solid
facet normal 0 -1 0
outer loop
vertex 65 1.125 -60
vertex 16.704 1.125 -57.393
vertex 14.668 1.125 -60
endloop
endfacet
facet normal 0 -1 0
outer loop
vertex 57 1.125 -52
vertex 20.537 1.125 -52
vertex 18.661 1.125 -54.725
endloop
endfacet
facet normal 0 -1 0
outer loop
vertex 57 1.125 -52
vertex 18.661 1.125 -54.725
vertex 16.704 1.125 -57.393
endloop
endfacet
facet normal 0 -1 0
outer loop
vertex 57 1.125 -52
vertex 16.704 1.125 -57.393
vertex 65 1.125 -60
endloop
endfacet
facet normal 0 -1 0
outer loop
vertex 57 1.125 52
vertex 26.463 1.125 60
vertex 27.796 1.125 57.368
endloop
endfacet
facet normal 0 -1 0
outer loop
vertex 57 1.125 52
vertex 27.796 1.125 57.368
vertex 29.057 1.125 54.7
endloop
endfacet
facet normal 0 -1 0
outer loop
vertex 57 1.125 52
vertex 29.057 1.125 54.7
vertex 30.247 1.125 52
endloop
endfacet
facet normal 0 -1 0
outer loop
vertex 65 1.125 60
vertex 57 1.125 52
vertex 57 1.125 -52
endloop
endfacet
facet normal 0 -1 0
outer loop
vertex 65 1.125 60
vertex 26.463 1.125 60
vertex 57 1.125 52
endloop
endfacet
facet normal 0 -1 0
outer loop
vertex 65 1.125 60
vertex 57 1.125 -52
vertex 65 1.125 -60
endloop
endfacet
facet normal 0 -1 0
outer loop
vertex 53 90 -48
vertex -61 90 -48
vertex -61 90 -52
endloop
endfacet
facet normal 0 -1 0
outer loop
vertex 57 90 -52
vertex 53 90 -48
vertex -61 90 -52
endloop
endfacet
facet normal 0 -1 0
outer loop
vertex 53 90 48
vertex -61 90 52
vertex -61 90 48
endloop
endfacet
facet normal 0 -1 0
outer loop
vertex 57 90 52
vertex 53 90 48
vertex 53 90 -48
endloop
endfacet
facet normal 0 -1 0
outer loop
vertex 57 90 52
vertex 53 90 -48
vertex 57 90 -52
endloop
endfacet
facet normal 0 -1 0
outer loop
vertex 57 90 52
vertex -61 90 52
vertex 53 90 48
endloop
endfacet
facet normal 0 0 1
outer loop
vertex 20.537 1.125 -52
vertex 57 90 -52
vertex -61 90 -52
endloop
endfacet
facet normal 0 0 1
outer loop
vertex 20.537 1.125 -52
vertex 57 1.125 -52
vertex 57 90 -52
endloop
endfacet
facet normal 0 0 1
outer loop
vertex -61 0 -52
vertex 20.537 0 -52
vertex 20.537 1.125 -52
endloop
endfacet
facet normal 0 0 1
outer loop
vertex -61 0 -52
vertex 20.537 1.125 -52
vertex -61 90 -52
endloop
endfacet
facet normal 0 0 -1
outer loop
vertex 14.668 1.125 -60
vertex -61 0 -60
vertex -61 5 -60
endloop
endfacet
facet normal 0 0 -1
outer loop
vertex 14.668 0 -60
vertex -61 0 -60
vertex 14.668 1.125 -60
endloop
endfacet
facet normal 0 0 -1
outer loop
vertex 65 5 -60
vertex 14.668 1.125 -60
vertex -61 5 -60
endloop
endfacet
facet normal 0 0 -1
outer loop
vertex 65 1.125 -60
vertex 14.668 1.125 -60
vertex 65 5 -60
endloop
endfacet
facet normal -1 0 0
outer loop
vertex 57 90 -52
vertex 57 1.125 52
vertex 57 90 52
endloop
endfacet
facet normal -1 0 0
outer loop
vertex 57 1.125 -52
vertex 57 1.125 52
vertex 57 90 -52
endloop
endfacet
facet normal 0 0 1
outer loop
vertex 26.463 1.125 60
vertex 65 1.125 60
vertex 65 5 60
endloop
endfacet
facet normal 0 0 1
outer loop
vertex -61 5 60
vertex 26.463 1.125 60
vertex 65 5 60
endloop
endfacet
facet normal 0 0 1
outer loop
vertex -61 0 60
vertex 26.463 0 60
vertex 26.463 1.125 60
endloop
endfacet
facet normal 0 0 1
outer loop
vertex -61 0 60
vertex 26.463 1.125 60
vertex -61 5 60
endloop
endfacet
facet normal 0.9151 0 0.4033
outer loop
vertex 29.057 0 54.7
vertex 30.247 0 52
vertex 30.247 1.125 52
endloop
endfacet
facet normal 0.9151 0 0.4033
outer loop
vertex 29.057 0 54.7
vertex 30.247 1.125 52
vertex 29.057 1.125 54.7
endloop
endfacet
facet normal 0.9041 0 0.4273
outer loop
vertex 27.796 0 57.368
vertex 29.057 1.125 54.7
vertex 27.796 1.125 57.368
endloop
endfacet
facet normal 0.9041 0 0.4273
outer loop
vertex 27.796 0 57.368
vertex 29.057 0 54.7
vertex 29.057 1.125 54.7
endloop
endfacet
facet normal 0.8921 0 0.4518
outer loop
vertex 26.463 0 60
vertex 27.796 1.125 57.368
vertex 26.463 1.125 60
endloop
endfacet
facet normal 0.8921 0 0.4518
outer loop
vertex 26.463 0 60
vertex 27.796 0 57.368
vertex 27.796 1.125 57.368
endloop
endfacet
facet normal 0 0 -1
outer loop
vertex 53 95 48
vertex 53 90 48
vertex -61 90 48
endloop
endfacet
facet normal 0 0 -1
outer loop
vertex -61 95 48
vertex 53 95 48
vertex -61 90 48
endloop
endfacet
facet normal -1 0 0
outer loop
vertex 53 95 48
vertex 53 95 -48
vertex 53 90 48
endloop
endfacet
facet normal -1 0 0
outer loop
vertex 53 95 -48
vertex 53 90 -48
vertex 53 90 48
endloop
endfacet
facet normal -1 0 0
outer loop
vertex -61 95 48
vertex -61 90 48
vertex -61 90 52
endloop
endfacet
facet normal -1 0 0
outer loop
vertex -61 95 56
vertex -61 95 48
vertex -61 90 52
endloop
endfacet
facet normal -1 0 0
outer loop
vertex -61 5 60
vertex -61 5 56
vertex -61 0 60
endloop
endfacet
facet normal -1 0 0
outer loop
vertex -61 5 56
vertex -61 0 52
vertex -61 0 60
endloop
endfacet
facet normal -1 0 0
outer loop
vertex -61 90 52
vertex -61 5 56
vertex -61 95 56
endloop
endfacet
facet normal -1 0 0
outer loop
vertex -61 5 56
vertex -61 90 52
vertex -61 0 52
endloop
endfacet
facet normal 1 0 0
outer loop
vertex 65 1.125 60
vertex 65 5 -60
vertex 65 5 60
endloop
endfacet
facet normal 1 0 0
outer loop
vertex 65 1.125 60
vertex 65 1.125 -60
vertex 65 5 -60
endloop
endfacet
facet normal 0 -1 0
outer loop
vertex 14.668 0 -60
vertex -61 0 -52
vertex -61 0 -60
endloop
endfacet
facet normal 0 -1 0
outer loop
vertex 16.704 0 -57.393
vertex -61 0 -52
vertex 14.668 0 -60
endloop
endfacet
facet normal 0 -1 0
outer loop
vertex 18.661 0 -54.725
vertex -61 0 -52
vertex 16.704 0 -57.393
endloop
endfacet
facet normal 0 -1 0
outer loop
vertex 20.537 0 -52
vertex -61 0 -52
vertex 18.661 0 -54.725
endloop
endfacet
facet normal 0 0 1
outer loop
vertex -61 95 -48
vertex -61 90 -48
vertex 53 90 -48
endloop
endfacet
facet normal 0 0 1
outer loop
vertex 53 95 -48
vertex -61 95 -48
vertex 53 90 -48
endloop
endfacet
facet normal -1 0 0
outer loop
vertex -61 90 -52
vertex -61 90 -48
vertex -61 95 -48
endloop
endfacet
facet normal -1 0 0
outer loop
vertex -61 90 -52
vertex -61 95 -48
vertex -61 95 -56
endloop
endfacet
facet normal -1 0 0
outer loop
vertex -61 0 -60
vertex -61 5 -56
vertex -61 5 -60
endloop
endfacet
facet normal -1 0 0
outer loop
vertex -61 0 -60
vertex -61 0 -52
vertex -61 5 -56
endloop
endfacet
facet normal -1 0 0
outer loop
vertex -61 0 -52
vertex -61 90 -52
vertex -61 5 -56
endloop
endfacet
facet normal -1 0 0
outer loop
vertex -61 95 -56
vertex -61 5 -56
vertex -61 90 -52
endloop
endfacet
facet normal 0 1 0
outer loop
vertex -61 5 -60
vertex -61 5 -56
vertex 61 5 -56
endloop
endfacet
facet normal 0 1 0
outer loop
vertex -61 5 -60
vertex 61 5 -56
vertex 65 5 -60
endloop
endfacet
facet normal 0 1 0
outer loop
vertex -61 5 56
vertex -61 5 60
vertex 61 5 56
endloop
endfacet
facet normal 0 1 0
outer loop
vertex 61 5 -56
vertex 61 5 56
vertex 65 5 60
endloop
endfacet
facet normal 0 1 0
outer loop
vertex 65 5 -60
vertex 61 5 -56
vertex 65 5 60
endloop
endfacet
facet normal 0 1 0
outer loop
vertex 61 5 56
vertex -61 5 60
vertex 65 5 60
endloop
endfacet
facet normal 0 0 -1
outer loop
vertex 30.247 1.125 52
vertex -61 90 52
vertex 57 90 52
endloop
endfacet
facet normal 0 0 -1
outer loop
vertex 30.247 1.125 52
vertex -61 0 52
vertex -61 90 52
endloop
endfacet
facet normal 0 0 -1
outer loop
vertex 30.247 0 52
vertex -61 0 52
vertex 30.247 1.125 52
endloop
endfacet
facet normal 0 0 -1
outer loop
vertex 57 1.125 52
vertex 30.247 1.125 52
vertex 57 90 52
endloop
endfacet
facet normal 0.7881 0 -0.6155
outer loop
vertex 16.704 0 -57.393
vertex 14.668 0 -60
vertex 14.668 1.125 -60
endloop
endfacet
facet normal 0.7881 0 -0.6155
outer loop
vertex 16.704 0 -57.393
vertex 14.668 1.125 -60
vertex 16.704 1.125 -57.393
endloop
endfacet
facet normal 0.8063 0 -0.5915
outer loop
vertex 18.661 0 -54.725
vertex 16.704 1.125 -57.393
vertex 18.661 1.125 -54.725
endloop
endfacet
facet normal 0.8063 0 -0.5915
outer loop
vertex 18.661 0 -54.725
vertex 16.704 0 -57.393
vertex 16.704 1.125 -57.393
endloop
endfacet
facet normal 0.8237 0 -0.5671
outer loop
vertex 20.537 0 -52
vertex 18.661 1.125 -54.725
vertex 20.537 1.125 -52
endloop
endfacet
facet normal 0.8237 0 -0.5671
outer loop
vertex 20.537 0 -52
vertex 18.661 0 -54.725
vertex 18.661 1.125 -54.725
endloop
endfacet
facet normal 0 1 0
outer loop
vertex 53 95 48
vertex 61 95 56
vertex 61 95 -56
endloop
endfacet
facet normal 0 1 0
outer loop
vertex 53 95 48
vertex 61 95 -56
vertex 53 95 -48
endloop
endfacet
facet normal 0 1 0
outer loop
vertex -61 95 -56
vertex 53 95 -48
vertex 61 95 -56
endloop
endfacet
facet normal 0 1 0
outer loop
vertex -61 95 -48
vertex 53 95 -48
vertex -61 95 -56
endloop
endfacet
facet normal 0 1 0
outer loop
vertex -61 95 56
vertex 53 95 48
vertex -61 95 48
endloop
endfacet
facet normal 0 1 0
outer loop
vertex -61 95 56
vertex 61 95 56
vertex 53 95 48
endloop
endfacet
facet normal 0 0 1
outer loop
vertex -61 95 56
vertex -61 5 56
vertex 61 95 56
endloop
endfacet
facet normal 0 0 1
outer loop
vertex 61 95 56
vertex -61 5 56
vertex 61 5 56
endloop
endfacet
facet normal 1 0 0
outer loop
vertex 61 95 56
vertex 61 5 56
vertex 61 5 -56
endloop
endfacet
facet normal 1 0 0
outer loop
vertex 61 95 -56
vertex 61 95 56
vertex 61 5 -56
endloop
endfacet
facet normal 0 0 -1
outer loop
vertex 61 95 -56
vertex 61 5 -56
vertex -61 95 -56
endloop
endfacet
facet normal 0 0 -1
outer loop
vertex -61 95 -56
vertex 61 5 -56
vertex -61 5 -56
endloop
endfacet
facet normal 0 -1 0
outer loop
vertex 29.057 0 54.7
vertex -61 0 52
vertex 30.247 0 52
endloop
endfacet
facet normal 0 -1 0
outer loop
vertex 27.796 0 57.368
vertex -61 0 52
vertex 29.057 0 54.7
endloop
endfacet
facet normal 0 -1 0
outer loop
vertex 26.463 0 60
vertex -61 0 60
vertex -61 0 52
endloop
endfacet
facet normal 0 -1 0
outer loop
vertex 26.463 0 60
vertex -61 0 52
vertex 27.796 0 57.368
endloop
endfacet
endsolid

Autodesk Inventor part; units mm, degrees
ref_plane "YZ Plane" through (0, 0, 0) normal (1, 0, 0) x (0, 1, 0)
ref_plane "XZ Plane" through (0, 0, 0) normal (0, 1, 0) x (-1, 0, 0)
ref_plane "XY Plane" through (0, 0, 0) normal (0, 0, 1) x (1, 0, 0)
sketch "Sketch8" plane through (0, 0, 0) normal (0, 1, 0) x (-1, 0, 0)
  line L0 (-61, -56) -> (61, -56)
  line L1 (61, -56) -> (61, 56)
  line L2 (61, 56) -> (-61, 56)
  line L3 (-61, 56) -> (-61, -56)
  line L4 (-61, -56) -> (61, 56) construction
  line L5 (61, -56) -> (-61, 56) construction
  point P0 (0, 0)
  dimension "d26" = 122
  dimension "d27" = 112
extrude "Extrusion7" add sketch "Sketch8" along normal blind 95
sketch "Sketch9" plane through (0, 0, 0) normal (0, -1, 0) x (1, 0, 0)
  line L0 (-61, 56) -> (61, 56) projected
  line L1 (-61, -56) -> (61, -56)
  line L2 (61, -56) -> (61, 56)
  line L3 (61, 56) -> (-61, 56)
  line L4 (-61, 56) -> (-61, -56)
  line L5 (-61, -56) -> (61, 56) construction
  line L6 (61, -56) -> (-61, 56) construction
  line L7 (57, 52) -> (57, -52)
  line L8 (57, -52) -> (-61, -52)
  line L9 (-61, 52) -> (57, 52)
  line L10 (53, -48) -> (53, 48)
  line L11 (53, 48) -> (-61, 48)
  line L12 (-61, -48) -> (53, -48)
  line L13 (-58.8844, -52) -> (-58.8844, -54.0578)
  line L14 (-58.8844, 54.0578) -> (-58.8844, 52)
  line L15 (-54.6854, 48) -> (-54.6854, 50.203)
  line L16 (-54.6854, -50.203) -> (-54.6854, -48)
  point P0 (0, 0)
  dimension "d30" = 4
  dimension "d31" = 4
  dimension "d47" = 4
  dimension "d48" = 4
  dimension "d49" = 4
  dimension "d50" = 4
extrude "Extrusion8" cut sketch "Sketch9" against normal blind 115 contours L11 L10 L12 L4
extrude "Extrusion9" cut sketch "Sketch9" against normal blind 90 contours L9 L7 L8 L4 L12 L10 L11
sketch "Sketch10" plane through (0, 0, 0) normal (0, -1, 0) x (1, 0, 0)
  line L0 (61, -56) -> (-61, -56)
  line L1 (-61, -56) -> (-61, 56)
  line L2 (-61, 56) -> (61, 56)
  line L3 (61, 56) -> (61, -56)
  line L4 (61, -56) -> (-61, 56) construction
  line L5 (-61, -56) -> (61, 56) construction
  line L6 (-65, 60) -> (-65, -60)
  line L7 (-65, -60) -> (65, -60)
  line L8 (65, -60) -> (65, 60)
  line L9 (65, 60) -> (-65, 60)
  line L10 (-61, 56) -> (-65, 56)
  line L11 (-61, -56) -> (-65, -56)
  line L12 (-61, 56) -> (-61, 60)
  line L13 (-61, -56) -> (-61, -60)
  point P0 (0, 0)
  dimension "d36" = 4
extrude "Extrusion10" add sketch "Sketch10" against normal blind 5 contours L3 L2 L12 L9 L8 L7 L13 L0
sketch "Sketch11" plane through (0, 0, 0) normal (0, -1, 0) x (1, 0, 0)
  circle A0 centre (-71, 9) radius 135
  line L0 (57, 52) -> (57, -52) projected
  line L1 (65, -60) -> (65, 60) projected
  circle A1 centre (-71, 9) radius 110
  line L2 (14.668, -60) -> (65, -60)
  line L3 (65, -60) -> (65, 60)
  line L4 (65, 60) -> (26.4628, 60)
  line L5 (-61, 60) -> (65, 60) projected
  point P0 (0, 0)
  dimension "d39" = 270
  dimension "d41" = 136
  dimension "d42" = 220
extrude "Extrusion11" cut sketch "Sketch11" against normal blind 1.125 contours A0 L0 | A0 L4 L1 L2 | L0 A0 L2 A1 L4
properties part number "Galvo Housing-01"
